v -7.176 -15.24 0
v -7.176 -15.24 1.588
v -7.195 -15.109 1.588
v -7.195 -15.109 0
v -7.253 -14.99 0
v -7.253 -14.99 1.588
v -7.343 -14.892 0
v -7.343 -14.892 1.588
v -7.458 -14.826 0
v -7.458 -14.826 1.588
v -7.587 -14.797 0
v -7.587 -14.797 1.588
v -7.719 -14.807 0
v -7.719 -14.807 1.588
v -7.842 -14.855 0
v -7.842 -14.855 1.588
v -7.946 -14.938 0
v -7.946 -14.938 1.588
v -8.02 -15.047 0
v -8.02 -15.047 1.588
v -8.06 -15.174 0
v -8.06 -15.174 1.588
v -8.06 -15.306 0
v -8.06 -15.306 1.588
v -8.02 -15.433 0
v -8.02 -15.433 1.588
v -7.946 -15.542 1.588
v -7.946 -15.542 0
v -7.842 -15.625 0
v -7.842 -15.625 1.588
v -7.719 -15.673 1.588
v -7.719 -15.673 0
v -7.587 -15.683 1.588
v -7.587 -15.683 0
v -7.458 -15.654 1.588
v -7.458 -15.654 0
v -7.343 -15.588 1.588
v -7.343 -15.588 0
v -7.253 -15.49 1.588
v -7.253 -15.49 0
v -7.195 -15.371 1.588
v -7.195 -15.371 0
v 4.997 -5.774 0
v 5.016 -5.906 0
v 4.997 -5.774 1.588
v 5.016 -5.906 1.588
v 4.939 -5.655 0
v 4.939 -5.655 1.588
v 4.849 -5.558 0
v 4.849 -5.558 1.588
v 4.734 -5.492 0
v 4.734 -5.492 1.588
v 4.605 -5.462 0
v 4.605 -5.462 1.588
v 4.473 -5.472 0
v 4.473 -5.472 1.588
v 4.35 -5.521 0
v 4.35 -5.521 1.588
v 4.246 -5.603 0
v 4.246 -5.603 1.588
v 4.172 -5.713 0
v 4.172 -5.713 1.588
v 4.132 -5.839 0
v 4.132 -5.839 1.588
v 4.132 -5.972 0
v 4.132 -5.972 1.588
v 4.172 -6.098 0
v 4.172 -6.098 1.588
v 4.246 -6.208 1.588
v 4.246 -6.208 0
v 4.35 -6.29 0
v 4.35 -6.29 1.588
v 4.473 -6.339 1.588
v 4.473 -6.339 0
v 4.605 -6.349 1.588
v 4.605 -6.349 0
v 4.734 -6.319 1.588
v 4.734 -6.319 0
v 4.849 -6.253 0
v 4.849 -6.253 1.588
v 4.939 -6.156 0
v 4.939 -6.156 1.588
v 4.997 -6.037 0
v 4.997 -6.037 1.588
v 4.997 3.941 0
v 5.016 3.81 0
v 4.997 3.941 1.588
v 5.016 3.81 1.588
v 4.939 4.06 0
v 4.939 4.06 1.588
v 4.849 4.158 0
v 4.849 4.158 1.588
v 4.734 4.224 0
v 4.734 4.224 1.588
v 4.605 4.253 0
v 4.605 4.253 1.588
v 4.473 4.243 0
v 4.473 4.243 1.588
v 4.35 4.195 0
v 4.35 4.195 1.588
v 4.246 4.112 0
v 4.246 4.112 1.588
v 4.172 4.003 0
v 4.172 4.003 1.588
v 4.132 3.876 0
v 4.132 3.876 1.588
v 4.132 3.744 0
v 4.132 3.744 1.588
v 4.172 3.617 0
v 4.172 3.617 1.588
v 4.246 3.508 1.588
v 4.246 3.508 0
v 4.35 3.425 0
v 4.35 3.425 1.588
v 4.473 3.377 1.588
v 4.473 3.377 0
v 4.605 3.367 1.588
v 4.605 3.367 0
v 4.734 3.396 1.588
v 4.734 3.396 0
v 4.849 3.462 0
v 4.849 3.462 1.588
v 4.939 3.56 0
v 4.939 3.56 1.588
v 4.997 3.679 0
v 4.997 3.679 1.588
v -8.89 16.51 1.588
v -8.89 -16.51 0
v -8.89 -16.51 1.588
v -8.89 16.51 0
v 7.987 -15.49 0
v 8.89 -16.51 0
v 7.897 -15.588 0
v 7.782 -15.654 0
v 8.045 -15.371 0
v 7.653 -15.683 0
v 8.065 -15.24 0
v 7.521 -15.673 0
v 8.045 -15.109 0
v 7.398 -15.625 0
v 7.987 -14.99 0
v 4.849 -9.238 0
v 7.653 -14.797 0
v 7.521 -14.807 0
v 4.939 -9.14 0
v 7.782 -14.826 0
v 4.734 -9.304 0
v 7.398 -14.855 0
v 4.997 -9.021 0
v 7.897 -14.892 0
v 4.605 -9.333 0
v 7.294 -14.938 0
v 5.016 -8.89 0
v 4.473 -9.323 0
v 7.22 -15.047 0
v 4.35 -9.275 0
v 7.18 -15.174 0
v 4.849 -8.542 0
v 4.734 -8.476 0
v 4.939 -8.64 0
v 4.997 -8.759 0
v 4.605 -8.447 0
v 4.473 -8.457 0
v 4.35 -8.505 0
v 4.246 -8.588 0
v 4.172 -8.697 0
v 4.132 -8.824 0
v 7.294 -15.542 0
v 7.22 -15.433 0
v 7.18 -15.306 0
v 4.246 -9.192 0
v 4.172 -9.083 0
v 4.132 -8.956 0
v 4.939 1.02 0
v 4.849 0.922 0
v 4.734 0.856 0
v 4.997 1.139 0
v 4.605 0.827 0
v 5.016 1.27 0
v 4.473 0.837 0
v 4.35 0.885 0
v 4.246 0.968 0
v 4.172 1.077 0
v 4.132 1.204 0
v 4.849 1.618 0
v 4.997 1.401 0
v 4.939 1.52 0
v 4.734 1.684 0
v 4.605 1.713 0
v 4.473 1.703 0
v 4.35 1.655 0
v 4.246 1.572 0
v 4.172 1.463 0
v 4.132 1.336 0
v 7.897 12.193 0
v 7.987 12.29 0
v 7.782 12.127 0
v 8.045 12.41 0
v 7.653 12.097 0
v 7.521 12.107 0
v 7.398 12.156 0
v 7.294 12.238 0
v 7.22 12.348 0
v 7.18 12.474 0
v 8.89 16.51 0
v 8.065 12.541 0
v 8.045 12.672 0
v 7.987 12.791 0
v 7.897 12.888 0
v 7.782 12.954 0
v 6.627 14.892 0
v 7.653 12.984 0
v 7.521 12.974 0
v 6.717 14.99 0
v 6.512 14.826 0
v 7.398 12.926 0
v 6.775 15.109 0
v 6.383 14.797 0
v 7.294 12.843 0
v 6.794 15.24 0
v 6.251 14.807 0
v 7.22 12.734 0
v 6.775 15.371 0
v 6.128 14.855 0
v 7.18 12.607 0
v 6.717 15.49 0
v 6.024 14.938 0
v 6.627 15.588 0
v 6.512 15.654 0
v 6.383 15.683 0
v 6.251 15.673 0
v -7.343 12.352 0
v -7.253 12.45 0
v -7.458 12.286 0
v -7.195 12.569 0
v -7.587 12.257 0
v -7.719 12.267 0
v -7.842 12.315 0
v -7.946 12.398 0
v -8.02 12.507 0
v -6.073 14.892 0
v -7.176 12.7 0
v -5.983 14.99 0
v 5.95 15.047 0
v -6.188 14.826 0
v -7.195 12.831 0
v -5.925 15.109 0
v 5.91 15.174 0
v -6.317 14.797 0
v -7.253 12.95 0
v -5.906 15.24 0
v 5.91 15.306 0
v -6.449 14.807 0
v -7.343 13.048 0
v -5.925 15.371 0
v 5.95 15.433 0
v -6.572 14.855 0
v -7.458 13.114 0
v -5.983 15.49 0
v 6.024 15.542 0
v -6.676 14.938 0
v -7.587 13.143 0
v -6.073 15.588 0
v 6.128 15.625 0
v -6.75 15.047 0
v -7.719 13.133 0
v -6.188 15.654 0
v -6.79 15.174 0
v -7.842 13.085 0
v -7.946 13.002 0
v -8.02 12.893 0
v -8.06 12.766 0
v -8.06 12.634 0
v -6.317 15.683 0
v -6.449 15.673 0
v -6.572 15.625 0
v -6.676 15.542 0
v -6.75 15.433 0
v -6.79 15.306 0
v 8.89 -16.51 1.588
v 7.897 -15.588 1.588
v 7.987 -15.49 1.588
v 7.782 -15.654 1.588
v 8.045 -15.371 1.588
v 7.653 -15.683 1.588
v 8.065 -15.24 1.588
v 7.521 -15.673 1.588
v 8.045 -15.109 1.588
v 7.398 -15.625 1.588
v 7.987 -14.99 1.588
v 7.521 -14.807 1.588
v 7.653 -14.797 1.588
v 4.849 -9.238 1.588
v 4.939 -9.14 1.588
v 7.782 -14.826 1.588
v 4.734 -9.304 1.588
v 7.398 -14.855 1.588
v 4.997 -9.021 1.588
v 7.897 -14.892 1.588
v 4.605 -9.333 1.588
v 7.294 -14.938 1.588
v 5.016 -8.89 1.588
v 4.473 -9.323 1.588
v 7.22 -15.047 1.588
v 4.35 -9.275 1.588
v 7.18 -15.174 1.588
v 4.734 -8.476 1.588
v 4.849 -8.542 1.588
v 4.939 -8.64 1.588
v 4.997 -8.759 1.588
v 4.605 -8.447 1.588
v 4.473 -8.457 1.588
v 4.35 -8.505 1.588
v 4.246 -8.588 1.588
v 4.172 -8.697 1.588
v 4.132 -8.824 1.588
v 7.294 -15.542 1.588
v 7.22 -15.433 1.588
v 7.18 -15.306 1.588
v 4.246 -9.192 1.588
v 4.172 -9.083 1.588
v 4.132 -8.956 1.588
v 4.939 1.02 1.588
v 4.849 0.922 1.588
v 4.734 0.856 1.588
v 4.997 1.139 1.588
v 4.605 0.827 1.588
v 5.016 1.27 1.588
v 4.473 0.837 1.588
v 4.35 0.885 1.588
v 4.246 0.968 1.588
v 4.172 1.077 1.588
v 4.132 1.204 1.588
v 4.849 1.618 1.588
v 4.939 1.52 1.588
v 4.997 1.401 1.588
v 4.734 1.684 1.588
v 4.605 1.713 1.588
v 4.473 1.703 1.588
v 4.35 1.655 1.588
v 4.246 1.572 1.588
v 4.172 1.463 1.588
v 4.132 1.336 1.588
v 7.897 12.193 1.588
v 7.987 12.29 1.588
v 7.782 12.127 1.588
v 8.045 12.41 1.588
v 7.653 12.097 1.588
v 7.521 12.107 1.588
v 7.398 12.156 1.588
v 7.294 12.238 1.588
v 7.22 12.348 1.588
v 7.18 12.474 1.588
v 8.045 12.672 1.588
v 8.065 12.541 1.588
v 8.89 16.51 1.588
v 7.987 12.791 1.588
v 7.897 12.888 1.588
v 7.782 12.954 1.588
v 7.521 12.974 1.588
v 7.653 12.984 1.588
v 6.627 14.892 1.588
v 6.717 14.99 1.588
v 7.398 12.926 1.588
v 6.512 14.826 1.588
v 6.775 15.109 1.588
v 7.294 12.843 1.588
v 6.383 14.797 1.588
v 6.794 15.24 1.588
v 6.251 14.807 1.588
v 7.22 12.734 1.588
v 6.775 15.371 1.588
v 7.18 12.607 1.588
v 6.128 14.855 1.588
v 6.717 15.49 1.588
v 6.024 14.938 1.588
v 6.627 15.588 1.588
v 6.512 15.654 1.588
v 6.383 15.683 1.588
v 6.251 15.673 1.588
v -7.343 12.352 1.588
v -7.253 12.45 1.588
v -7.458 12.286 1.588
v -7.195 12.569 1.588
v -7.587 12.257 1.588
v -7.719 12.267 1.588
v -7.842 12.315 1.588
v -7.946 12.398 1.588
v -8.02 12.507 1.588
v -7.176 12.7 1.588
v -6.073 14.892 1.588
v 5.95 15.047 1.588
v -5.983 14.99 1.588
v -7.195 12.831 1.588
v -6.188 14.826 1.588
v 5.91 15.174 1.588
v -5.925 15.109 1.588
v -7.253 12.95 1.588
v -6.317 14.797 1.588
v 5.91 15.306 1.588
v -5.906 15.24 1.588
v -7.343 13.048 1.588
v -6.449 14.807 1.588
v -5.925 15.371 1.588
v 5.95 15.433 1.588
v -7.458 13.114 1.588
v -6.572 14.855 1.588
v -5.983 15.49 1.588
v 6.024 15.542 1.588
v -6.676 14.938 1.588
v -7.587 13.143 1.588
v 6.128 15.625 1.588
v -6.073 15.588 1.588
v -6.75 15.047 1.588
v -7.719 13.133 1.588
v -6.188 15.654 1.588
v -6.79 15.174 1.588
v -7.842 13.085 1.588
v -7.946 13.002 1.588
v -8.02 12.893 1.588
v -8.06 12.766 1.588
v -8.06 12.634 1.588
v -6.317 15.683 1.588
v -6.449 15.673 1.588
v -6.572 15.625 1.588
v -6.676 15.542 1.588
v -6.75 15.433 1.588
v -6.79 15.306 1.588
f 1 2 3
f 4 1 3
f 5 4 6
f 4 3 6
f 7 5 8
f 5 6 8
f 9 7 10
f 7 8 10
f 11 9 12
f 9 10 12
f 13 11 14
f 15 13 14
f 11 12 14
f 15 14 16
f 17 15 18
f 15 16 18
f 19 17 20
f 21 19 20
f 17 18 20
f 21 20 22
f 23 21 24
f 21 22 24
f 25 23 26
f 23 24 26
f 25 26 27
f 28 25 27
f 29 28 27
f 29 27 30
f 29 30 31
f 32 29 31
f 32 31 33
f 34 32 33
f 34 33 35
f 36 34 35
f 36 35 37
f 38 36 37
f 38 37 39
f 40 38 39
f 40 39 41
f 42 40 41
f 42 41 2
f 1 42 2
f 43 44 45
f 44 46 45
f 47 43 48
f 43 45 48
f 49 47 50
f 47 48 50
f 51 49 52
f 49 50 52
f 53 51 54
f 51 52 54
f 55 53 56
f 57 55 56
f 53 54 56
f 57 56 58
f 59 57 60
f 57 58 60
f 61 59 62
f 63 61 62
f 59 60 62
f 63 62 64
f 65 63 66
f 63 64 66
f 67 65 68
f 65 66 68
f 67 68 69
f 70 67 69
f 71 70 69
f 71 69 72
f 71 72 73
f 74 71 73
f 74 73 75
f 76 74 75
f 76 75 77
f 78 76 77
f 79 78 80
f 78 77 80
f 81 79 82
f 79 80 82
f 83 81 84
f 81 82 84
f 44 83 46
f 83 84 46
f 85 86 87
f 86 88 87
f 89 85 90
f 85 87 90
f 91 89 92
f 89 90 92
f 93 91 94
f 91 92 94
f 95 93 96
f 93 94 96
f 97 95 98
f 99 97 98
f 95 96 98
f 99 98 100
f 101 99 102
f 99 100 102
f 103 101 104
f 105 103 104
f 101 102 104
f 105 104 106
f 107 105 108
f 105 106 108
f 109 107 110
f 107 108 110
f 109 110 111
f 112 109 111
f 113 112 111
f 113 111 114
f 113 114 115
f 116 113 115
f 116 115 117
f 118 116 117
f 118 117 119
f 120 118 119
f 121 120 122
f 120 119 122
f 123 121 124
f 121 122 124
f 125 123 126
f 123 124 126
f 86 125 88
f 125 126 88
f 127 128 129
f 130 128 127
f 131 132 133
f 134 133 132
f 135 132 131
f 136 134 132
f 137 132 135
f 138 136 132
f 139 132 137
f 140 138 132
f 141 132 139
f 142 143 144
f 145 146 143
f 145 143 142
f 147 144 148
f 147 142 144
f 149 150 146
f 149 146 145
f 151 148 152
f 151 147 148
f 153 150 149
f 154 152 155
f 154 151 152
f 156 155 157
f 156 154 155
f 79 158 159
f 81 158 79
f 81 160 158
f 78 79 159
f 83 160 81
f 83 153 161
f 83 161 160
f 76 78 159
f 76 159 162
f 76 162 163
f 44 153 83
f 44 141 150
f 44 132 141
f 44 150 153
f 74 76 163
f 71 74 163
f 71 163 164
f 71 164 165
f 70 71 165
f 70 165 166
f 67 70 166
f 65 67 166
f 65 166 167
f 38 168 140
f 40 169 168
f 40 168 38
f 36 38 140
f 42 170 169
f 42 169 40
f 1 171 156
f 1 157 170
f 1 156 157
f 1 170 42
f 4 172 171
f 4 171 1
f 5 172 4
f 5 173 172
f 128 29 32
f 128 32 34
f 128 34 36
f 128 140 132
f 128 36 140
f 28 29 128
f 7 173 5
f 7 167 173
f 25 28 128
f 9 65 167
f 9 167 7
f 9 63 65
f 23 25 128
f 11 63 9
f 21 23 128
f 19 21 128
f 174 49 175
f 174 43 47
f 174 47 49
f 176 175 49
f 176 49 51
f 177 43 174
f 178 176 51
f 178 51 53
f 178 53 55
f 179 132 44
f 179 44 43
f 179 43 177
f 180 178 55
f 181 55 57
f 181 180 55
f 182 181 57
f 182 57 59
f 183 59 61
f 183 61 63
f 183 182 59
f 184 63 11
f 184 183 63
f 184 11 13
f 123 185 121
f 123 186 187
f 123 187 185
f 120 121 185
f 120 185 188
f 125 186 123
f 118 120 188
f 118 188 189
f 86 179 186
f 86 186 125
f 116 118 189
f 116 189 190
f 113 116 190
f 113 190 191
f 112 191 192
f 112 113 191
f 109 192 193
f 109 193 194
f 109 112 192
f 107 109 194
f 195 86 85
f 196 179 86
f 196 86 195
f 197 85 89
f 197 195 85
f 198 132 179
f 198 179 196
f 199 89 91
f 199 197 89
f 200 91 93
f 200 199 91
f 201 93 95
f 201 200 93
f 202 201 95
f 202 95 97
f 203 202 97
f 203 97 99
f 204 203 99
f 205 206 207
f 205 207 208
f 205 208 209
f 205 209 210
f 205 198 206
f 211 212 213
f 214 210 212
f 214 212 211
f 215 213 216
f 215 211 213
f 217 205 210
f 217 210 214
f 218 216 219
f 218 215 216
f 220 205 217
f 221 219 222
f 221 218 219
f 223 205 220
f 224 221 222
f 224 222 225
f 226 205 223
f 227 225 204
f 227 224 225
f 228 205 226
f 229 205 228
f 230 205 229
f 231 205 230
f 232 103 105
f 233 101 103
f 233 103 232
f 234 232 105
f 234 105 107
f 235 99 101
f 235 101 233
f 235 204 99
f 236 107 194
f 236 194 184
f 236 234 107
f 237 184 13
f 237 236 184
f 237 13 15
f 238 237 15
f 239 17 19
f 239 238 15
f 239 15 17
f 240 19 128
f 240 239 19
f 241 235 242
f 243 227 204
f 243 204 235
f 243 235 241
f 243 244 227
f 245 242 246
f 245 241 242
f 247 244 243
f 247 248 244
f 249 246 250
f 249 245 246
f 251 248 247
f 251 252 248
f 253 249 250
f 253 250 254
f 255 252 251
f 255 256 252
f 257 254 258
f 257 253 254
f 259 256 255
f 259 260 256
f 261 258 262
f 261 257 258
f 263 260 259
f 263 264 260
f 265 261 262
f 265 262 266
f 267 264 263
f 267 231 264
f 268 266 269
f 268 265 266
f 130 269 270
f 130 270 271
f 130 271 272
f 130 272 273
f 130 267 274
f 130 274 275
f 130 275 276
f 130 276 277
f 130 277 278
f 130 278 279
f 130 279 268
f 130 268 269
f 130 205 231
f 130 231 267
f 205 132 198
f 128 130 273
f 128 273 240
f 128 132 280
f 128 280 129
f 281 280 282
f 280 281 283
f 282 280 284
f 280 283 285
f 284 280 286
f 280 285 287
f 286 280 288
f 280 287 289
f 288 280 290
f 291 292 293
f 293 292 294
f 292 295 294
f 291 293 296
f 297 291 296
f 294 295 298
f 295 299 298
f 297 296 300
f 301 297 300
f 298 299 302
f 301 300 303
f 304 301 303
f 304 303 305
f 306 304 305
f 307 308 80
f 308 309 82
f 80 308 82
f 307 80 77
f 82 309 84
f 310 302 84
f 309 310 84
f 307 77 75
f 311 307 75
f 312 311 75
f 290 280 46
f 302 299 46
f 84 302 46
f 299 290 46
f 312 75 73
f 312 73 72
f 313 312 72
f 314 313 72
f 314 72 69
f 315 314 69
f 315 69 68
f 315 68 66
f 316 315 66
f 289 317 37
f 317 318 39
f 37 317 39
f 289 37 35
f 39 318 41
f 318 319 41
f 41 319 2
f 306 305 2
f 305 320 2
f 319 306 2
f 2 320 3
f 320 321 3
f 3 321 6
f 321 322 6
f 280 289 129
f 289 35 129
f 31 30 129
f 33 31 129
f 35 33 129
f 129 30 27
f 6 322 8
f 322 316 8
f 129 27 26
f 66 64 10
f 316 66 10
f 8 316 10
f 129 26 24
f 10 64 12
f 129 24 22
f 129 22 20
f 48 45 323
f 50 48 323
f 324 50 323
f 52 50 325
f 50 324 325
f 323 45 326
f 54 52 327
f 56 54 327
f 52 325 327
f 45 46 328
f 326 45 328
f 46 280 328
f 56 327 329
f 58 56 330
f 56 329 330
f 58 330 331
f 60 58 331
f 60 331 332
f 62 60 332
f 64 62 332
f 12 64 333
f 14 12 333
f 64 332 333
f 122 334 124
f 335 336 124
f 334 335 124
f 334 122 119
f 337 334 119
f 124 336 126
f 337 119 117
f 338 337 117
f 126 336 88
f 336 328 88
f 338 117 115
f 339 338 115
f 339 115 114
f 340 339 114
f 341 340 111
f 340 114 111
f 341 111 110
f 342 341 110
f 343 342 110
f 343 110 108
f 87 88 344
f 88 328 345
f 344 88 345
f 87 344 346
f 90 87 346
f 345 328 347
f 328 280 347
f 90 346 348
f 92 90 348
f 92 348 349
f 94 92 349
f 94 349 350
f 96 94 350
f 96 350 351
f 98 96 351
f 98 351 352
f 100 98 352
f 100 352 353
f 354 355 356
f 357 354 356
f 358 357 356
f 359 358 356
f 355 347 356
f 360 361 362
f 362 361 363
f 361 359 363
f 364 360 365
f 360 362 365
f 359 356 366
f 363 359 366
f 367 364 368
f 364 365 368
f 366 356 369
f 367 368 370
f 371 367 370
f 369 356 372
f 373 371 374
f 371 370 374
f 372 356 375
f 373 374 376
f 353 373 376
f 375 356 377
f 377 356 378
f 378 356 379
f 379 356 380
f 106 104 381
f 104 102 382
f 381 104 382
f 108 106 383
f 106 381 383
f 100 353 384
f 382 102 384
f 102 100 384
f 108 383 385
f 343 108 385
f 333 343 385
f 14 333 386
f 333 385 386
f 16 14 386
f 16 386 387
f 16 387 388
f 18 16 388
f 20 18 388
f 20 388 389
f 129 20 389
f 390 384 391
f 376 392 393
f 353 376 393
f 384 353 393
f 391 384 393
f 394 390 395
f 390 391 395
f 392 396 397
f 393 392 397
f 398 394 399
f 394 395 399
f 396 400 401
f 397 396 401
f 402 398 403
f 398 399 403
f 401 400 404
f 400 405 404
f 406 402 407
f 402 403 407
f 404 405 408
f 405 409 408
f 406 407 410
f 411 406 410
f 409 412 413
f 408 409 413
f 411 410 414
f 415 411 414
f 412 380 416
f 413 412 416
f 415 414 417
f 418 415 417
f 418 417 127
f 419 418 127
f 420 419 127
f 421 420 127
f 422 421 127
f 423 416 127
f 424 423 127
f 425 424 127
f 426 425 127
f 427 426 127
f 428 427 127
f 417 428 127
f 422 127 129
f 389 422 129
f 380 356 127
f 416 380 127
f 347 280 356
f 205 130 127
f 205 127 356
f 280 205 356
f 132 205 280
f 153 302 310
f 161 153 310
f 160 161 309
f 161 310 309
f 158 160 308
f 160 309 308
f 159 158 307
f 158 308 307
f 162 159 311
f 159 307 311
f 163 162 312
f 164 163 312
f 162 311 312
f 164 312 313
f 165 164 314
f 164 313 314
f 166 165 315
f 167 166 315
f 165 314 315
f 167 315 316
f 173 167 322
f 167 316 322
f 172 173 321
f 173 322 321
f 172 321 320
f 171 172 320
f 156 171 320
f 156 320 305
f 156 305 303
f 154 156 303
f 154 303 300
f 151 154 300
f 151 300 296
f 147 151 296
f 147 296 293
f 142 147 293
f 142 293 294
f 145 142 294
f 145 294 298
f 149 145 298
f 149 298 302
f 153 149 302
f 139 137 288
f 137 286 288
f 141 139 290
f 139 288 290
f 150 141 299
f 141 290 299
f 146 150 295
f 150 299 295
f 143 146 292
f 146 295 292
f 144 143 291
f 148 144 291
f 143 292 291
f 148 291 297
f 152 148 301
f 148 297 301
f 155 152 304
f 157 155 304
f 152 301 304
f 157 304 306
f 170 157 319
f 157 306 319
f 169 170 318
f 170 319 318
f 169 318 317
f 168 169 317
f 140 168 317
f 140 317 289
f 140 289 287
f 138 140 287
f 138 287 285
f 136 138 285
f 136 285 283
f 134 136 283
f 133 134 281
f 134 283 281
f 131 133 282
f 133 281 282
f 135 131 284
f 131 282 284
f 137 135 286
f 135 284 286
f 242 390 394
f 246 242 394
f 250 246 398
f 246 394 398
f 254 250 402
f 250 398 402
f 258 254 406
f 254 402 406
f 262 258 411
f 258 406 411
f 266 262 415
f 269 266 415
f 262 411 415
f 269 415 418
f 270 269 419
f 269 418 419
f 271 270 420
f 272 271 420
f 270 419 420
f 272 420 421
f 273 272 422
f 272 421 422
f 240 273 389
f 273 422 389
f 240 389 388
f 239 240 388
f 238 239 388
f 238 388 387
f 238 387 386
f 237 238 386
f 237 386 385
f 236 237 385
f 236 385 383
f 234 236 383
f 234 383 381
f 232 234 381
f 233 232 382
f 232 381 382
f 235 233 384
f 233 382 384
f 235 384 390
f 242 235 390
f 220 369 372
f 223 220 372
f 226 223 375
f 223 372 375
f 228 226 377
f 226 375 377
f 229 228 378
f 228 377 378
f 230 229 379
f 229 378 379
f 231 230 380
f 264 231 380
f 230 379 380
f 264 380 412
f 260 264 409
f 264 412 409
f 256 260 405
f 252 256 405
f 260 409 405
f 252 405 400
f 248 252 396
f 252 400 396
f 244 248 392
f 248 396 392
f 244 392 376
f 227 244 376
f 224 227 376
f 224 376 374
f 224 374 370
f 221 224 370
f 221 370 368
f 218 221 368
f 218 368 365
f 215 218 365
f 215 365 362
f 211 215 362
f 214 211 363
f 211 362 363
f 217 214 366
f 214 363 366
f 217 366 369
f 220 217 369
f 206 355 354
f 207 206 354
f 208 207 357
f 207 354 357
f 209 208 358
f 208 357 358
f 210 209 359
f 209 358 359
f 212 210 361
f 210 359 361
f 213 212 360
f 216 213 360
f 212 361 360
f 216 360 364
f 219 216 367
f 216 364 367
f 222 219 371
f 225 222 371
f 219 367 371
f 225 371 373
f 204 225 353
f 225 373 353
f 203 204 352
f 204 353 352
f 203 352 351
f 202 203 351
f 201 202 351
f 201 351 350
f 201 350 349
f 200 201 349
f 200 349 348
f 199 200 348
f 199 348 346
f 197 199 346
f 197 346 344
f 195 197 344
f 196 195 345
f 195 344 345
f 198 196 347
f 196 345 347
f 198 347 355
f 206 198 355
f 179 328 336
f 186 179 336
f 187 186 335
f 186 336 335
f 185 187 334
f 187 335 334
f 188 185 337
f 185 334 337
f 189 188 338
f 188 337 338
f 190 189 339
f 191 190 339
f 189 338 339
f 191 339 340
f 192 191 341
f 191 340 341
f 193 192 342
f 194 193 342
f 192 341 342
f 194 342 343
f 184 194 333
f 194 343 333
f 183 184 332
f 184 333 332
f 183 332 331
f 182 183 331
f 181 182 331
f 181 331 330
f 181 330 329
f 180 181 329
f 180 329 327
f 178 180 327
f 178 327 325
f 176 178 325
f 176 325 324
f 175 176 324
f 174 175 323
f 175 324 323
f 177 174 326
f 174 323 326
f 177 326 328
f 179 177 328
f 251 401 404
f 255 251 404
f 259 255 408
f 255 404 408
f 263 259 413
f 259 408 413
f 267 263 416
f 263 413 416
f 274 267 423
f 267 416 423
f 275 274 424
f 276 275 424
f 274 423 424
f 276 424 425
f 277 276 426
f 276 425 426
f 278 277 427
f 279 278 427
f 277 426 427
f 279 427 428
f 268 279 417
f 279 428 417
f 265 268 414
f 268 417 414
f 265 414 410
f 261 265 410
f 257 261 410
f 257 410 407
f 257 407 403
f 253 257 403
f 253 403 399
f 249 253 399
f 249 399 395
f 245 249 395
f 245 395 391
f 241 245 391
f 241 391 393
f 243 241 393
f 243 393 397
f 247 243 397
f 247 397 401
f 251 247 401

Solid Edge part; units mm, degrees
sketch "Sketch1" plane through (0, 0, 0) normal (0, 0, 1) x (1, 0, 0)
  line L0 (-8.89, 16.51) -> (8.89, 16.51)
  line L1 (8.89, 16.51) -> (8.89, -16.51)
  line L2 (8.89, -16.51) -> (-8.89, -16.51)
  line L3 (-8.89, -16.51) -> (-8.89, 16.51)
extrude "Protrusion1" add sketch "Sketch1" along normal blind 1.5875
sketch "Sketch2" plane through (0, 0, 1.5875) normal (0, 0, 1) x (1, 0, 0)
  circle A0 centre (7.62, -15.24) radius 0.4445
  circle A1 centre (4.572, -8.89) radius 0.4445
  circle A2 centre (4.572, -5.9055) radius 0.4445
  circle A3 centre (4.572, 1.27) radius 0.4445
  circle A4 centre (4.572, 3.81) radius 0.4445
  circle A5 centre (7.62, 12.5407) radius 0.4445
  circle A6 centre (6.35, 15.24) radius 0.4445
  circle A7 centre (-6.35, 15.24) radius 0.4445
  circle A8 centre (-7.62, 12.7) radius 0.4445
  circle A9 centre (-7.62, -15.24) radius 0.4445
  dimension "D1" = 1.27
  dimension "D2" = 2.54
  dimension "D3" = 0.889
  dimension "D4" = 3.81
  dimension "D5" = 1.27
  dimension "D6" = 4.318
  dimension "D7" = 12.7
  dimension "D8" = 7.62
  dimension "D9" = 2.54
  dimension "D10" = 27.94
  dimension "D11" = 12.7
extrude "Cutout1" cut sketch "Sketch2" against normal through all
